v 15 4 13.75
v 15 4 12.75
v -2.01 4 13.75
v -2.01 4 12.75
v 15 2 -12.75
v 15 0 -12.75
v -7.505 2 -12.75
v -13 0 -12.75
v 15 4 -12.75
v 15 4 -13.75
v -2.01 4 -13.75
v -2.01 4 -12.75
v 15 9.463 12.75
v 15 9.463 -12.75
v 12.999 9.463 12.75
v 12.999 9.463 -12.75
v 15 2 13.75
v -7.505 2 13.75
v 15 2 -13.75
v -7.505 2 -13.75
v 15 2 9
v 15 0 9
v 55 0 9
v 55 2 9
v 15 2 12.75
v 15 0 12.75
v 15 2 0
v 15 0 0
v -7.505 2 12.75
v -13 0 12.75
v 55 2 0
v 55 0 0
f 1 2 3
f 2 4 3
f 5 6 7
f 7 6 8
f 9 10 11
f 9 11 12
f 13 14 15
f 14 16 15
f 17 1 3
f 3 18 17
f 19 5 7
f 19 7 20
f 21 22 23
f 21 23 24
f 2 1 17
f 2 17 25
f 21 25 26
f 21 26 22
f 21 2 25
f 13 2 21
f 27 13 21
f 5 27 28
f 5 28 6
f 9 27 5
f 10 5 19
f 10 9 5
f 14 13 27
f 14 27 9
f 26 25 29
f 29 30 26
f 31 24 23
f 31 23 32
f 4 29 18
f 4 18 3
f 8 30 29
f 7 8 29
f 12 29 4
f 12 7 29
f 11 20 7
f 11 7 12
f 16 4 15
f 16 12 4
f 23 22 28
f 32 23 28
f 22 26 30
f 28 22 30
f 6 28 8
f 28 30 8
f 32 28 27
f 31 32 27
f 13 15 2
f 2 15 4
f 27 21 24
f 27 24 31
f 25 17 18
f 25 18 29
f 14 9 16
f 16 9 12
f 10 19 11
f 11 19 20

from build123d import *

# Parameters (mm, degrees)
SKETCH1_W           = 26
SKETCH1_H           = 25.5
BOSS_EXTRUDE1_DEPTH = 9.463
SKETCH2_W           = 26
SKETCH2_H           = 2
BOSS_EXTRUDE3_DEPTH = 1
SKETCH3_W           = 26
SKETCH3_H           = 2
BOSS_EXTRUDE4_DEPTH = 1
CHAMFER2_SIZE       = 9.463
CHAMFER2_SIZE_2     = 25.99937882
BOSS_EXTRUDE5_DEPTH = 2
SKETCH5_W           = 9
SKETCH5_H           = 2
BOSS_EXTRUDE6_DEPTH = 40


with BuildPart() as part:
    # Sketch1 → Boss-Extrude1 (new body)
    with BuildSketch(Plane(origin=(0, 0, 0), x_dir=(1, 0, 0), z_dir=(0, 1, 0))):
        Rectangle(SKETCH1_W, SKETCH1_H)
    extrude(amount=BOSS_EXTRUDE1_DEPTH)

    # Sketch2 → Boss-Extrude3 (add)
    with BuildSketch(Plane.XY.offset(12.75)):
        with Locations((0, 3)):
            Rectangle(SKETCH2_W, SKETCH2_H)
    extrude(amount=BOSS_EXTRUDE3_DEPTH)

    # Sketch3 → Boss-Extrude4 (add)
    with BuildSketch(Plane(origin=(0, 0, -12.75), x_dir=(-1, 0, 0), z_dir=(0, 0, -1))):
        with Locations((0, 3)):
            Rectangle(SKETCH3_W, SKETCH3_H)
    extrude(amount=BOSS_EXTRUDE4_DEPTH)

    # Chamfer2
    # the kernel refuses this chamfer: 25.99937882, 9.463 mm, written as the material it takes off along each edge
    with BuildSketch(Plane(origin=(-13, 9.463, -80.197451585), x_dir=(-0.09904090225205063, -0.9950833631817486, 0), z_dir=(0, 0, 1))) as chamfer2_piece_1:
        Polygon((CHAMFER2_SIZE * 0.995083363182, CHAMFER2_SIZE * 0.0990409022521), (-CHAMFER2_SIZE_2 * 0.0990409022532, CHAMFER2_SIZE_2 * 0.995083363193), (0, 0), align=None)
    extrude(amount=160.39490317, mode=Mode.SUBTRACT)

    # Sketch4 → Boss-Extrude5 (add)
    with BuildSketch(Plane(origin=(13, 0, 0), x_dir=(0, 0, -1), z_dir=(1, 0, 0))):
        Polygon((-12.75, 0), (12.75, 0), (12.75, 2), (13.75, 2), (13.75, 4), (12.75, 4), (12.75, 9.463), (-12.75, 9.463), (-12.75, 4), (-13.75, 4), (-13.75, 2), (-12.75, 2), align=None)
    extrude(amount=BOSS_EXTRUDE5_DEPTH)

    # Sketch5 → Boss-Extrude6 (add)
    with BuildSketch(Plane(origin=(15, 0, 0), x_dir=(0, 0, -1), z_dir=(1, 0, 0))):
        with Locations((-4.5, 1)):
            Rectangle(SKETCH5_W, SKETCH5_H)
    extrude(amount=BOSS_EXTRUDE6_DEPTH)


solid = part.part
